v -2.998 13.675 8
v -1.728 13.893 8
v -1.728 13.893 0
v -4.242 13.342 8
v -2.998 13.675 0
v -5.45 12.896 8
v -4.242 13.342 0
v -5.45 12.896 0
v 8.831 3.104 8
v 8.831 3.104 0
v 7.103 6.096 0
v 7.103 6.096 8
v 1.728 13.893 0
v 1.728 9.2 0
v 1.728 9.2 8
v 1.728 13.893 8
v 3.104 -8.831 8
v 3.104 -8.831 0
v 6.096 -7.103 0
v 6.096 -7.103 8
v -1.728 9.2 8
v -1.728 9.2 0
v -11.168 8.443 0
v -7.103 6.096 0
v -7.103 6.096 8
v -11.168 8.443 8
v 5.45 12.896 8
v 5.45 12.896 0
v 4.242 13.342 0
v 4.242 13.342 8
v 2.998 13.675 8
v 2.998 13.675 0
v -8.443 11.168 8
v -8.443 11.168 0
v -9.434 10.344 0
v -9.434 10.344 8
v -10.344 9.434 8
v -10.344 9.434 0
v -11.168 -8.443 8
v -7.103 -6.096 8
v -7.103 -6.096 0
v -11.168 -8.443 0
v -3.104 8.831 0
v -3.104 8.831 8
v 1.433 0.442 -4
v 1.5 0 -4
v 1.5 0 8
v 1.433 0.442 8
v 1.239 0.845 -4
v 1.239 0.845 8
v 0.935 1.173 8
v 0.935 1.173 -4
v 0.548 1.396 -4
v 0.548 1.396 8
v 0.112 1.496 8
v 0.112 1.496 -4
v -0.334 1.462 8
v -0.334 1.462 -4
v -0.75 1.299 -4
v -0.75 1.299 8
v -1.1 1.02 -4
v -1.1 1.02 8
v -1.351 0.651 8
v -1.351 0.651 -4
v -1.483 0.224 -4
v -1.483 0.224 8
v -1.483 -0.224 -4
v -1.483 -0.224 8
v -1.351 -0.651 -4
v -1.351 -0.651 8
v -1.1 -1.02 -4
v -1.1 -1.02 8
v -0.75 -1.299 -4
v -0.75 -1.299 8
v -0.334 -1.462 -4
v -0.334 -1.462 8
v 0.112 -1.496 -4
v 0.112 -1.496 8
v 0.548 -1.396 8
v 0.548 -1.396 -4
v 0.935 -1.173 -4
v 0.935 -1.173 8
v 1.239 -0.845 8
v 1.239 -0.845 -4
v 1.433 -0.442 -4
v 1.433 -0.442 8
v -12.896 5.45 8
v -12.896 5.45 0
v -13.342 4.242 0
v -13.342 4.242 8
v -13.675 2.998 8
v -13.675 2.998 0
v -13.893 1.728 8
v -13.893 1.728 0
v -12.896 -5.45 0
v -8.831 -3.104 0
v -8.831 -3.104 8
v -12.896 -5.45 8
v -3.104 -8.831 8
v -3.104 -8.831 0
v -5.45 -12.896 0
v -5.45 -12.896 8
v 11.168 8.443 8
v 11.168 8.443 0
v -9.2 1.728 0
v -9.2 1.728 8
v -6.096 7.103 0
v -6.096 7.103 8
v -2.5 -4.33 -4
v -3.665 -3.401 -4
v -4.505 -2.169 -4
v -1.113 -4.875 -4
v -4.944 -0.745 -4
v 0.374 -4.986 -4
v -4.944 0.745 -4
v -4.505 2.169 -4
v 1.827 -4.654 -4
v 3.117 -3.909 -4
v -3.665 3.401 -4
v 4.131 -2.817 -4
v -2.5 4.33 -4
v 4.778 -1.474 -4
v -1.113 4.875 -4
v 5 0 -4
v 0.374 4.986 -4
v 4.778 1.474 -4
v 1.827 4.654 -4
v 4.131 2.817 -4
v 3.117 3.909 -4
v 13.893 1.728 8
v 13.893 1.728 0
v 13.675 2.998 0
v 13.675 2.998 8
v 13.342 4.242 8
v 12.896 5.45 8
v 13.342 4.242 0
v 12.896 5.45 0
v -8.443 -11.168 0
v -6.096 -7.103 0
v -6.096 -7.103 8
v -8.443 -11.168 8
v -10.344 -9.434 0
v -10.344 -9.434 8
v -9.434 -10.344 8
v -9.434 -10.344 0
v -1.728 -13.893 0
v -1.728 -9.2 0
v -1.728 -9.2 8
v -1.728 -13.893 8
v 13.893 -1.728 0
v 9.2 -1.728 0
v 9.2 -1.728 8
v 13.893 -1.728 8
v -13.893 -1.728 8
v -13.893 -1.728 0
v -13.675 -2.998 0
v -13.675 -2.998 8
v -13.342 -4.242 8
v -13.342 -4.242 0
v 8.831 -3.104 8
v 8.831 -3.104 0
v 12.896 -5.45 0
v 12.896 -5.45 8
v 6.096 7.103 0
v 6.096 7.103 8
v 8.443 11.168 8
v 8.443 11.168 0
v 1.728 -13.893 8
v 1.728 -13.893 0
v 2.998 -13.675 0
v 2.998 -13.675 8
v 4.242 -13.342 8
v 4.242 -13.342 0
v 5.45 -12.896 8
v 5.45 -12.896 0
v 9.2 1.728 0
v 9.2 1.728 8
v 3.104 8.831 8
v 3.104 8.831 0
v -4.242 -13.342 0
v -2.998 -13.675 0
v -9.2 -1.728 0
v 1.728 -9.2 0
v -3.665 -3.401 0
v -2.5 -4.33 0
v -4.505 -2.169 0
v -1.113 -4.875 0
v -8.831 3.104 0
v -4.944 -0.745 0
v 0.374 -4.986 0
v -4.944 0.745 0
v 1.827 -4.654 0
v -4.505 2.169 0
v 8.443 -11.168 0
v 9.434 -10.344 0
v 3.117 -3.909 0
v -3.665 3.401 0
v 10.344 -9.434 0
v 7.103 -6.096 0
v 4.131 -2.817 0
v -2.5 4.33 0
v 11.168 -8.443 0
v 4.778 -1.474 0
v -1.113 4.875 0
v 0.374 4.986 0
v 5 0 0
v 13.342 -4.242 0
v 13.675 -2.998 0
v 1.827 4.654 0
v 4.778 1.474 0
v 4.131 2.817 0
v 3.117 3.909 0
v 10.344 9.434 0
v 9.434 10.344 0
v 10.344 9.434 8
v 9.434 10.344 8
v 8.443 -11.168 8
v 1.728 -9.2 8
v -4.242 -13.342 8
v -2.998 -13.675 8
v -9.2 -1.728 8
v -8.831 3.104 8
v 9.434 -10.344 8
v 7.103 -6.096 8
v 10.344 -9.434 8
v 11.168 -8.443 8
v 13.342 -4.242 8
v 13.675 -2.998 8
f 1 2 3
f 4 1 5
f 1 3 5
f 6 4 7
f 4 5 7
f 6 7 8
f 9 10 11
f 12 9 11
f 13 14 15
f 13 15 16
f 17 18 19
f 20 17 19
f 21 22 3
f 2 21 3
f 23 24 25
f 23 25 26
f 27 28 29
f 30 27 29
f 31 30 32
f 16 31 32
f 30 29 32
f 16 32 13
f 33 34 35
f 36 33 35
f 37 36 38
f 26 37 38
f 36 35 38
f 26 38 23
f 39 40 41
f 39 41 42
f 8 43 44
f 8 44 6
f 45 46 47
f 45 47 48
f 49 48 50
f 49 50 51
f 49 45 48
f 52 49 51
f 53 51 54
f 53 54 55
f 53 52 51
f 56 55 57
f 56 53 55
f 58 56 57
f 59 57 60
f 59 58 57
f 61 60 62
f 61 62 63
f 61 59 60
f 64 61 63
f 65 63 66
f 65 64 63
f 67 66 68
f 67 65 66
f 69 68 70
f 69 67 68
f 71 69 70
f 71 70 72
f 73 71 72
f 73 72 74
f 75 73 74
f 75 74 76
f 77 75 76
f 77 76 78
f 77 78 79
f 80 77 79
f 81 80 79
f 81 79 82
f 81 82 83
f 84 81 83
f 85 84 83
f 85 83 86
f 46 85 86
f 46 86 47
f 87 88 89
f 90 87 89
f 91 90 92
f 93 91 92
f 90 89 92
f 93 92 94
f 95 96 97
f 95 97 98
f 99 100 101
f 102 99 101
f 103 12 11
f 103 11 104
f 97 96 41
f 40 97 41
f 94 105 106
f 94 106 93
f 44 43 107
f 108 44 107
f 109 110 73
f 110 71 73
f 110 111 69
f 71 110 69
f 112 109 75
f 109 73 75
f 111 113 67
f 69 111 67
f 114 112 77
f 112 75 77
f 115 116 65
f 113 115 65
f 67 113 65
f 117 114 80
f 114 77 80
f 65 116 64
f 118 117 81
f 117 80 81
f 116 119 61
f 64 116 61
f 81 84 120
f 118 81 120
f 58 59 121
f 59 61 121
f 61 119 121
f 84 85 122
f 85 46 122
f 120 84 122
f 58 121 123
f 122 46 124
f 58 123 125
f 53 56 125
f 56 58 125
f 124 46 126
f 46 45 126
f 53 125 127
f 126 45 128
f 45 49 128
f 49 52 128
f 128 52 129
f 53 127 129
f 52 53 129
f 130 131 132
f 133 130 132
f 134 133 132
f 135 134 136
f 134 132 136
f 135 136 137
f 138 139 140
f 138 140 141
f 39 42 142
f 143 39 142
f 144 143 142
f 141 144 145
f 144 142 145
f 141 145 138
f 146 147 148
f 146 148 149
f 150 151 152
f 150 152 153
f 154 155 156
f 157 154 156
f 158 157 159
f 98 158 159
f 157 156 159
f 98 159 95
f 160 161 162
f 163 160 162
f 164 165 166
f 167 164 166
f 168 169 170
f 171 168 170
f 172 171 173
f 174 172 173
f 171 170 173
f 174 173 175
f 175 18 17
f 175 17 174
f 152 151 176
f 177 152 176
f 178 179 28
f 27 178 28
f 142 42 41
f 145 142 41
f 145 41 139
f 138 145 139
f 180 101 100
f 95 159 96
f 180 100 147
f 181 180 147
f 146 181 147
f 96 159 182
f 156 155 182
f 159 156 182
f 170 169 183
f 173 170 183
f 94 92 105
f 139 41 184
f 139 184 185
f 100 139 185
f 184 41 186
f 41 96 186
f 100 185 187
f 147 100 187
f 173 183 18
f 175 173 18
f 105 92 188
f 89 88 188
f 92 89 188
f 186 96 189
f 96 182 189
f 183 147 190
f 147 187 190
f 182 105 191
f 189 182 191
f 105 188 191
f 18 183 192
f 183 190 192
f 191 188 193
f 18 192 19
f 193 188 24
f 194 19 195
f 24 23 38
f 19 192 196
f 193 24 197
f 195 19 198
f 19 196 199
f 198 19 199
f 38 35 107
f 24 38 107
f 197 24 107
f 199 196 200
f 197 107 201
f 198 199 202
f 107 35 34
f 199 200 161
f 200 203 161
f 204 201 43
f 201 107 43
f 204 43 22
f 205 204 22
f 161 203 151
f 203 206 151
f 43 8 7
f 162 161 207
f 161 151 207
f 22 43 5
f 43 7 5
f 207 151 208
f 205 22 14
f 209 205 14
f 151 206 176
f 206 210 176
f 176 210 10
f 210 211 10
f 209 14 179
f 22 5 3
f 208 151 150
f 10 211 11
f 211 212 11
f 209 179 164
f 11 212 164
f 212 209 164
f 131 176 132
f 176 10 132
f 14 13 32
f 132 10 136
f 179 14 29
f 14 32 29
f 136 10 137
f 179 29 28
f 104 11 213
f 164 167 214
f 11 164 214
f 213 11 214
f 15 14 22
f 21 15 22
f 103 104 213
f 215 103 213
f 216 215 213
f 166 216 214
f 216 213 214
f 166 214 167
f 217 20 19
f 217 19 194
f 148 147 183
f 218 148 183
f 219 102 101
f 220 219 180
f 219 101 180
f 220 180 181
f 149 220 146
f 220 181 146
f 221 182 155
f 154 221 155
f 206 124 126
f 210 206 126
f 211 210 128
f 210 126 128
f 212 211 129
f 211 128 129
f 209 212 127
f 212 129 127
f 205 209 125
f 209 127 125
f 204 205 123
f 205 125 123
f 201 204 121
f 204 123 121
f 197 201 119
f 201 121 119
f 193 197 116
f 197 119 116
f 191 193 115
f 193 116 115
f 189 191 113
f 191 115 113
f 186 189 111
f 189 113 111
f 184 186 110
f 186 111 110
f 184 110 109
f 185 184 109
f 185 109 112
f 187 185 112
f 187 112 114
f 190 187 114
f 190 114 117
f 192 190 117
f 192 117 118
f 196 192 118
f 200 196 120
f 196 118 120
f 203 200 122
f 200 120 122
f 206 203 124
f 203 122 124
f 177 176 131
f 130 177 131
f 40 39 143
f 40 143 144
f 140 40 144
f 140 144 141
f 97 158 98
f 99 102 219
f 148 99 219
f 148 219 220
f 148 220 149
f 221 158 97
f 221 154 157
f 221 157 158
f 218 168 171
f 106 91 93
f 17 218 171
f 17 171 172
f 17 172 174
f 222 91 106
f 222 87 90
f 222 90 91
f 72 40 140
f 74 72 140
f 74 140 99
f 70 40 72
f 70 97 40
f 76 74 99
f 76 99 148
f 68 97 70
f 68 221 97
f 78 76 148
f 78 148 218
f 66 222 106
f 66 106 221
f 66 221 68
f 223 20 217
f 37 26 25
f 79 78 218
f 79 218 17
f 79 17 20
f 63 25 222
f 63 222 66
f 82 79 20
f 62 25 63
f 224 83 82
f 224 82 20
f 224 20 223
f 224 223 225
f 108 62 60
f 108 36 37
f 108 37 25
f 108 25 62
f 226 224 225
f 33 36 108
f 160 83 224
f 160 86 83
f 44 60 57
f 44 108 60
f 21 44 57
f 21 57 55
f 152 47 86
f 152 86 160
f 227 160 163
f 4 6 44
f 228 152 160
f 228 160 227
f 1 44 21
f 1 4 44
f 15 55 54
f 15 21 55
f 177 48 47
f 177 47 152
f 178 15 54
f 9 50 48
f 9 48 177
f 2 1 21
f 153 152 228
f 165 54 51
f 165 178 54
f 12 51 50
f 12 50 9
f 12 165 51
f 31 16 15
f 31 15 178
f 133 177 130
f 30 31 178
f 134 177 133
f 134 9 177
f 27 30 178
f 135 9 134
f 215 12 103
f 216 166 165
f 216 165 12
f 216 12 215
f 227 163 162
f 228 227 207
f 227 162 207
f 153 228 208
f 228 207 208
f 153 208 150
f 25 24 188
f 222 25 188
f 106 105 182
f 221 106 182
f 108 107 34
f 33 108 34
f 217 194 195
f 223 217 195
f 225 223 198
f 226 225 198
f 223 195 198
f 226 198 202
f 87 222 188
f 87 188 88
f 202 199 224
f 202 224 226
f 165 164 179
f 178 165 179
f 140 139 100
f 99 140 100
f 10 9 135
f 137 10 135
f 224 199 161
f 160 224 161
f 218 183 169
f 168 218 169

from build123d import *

# Parameters (mm, degrees)
SKETCH1_R           = 14
SKETCH1_R_2         = 1.5
BOSS_EXTRUDE1_DEPTH = 8
SKETCH2_W           = 5.1
SKETCH2_H           = 3.455751918
CUT_EXTRUDE2_DEPTH  = 9
CIRPATTERN1_COUNT   = 12
BOSS_EXTRUDE2_START = -4
SKETCH3_R           = 5
SKETCH3_R_2         = 1.5
BOSS_EXTRUDE2_DEPTH = 4


with BuildPart() as part:
    # Sketch1 → Boss-Extrude1 (new body)
    with BuildSketch(Plane.XY):
        Circle(SKETCH1_R)
        Circle(SKETCH1_R_2, mode=Mode.SUBTRACT)
    extrude(amount=BOSS_EXTRUDE1_DEPTH)

    # Sketch2 → Cut-Extrude2 (cut)
    with BuildSketch(Plane.XY):
        with Locations((11.75, 0)):
            Rectangle(SKETCH2_W, SKETCH2_H)
    cut_extrude2 = extrude(amount=CUT_EXTRUDE2_DEPTH, mode=Mode.SUBTRACT)

    # CirPattern1: Cut-Extrude2 ×12 about axis
    cirpattern1_axis = Axis((0, 0, -0.4), (0, 0, 1))
    for i in range(1, CIRPATTERN1_COUNT):
        add(cut_extrude2.rotate(cirpattern1_axis, i * 360 / CIRPATTERN1_COUNT), mode=Mode.SUBTRACT)

    # Sketch3 → Boss-Extrude2 (add)
    with BuildSketch(Plane.XY.offset(BOSS_EXTRUDE2_START)):
        Circle(SKETCH3_R)
        Circle(SKETCH3_R_2, mode=Mode.SUBTRACT)
    extrude(amount=BOSS_EXTRUDE2_DEPTH)


solid = part.part
